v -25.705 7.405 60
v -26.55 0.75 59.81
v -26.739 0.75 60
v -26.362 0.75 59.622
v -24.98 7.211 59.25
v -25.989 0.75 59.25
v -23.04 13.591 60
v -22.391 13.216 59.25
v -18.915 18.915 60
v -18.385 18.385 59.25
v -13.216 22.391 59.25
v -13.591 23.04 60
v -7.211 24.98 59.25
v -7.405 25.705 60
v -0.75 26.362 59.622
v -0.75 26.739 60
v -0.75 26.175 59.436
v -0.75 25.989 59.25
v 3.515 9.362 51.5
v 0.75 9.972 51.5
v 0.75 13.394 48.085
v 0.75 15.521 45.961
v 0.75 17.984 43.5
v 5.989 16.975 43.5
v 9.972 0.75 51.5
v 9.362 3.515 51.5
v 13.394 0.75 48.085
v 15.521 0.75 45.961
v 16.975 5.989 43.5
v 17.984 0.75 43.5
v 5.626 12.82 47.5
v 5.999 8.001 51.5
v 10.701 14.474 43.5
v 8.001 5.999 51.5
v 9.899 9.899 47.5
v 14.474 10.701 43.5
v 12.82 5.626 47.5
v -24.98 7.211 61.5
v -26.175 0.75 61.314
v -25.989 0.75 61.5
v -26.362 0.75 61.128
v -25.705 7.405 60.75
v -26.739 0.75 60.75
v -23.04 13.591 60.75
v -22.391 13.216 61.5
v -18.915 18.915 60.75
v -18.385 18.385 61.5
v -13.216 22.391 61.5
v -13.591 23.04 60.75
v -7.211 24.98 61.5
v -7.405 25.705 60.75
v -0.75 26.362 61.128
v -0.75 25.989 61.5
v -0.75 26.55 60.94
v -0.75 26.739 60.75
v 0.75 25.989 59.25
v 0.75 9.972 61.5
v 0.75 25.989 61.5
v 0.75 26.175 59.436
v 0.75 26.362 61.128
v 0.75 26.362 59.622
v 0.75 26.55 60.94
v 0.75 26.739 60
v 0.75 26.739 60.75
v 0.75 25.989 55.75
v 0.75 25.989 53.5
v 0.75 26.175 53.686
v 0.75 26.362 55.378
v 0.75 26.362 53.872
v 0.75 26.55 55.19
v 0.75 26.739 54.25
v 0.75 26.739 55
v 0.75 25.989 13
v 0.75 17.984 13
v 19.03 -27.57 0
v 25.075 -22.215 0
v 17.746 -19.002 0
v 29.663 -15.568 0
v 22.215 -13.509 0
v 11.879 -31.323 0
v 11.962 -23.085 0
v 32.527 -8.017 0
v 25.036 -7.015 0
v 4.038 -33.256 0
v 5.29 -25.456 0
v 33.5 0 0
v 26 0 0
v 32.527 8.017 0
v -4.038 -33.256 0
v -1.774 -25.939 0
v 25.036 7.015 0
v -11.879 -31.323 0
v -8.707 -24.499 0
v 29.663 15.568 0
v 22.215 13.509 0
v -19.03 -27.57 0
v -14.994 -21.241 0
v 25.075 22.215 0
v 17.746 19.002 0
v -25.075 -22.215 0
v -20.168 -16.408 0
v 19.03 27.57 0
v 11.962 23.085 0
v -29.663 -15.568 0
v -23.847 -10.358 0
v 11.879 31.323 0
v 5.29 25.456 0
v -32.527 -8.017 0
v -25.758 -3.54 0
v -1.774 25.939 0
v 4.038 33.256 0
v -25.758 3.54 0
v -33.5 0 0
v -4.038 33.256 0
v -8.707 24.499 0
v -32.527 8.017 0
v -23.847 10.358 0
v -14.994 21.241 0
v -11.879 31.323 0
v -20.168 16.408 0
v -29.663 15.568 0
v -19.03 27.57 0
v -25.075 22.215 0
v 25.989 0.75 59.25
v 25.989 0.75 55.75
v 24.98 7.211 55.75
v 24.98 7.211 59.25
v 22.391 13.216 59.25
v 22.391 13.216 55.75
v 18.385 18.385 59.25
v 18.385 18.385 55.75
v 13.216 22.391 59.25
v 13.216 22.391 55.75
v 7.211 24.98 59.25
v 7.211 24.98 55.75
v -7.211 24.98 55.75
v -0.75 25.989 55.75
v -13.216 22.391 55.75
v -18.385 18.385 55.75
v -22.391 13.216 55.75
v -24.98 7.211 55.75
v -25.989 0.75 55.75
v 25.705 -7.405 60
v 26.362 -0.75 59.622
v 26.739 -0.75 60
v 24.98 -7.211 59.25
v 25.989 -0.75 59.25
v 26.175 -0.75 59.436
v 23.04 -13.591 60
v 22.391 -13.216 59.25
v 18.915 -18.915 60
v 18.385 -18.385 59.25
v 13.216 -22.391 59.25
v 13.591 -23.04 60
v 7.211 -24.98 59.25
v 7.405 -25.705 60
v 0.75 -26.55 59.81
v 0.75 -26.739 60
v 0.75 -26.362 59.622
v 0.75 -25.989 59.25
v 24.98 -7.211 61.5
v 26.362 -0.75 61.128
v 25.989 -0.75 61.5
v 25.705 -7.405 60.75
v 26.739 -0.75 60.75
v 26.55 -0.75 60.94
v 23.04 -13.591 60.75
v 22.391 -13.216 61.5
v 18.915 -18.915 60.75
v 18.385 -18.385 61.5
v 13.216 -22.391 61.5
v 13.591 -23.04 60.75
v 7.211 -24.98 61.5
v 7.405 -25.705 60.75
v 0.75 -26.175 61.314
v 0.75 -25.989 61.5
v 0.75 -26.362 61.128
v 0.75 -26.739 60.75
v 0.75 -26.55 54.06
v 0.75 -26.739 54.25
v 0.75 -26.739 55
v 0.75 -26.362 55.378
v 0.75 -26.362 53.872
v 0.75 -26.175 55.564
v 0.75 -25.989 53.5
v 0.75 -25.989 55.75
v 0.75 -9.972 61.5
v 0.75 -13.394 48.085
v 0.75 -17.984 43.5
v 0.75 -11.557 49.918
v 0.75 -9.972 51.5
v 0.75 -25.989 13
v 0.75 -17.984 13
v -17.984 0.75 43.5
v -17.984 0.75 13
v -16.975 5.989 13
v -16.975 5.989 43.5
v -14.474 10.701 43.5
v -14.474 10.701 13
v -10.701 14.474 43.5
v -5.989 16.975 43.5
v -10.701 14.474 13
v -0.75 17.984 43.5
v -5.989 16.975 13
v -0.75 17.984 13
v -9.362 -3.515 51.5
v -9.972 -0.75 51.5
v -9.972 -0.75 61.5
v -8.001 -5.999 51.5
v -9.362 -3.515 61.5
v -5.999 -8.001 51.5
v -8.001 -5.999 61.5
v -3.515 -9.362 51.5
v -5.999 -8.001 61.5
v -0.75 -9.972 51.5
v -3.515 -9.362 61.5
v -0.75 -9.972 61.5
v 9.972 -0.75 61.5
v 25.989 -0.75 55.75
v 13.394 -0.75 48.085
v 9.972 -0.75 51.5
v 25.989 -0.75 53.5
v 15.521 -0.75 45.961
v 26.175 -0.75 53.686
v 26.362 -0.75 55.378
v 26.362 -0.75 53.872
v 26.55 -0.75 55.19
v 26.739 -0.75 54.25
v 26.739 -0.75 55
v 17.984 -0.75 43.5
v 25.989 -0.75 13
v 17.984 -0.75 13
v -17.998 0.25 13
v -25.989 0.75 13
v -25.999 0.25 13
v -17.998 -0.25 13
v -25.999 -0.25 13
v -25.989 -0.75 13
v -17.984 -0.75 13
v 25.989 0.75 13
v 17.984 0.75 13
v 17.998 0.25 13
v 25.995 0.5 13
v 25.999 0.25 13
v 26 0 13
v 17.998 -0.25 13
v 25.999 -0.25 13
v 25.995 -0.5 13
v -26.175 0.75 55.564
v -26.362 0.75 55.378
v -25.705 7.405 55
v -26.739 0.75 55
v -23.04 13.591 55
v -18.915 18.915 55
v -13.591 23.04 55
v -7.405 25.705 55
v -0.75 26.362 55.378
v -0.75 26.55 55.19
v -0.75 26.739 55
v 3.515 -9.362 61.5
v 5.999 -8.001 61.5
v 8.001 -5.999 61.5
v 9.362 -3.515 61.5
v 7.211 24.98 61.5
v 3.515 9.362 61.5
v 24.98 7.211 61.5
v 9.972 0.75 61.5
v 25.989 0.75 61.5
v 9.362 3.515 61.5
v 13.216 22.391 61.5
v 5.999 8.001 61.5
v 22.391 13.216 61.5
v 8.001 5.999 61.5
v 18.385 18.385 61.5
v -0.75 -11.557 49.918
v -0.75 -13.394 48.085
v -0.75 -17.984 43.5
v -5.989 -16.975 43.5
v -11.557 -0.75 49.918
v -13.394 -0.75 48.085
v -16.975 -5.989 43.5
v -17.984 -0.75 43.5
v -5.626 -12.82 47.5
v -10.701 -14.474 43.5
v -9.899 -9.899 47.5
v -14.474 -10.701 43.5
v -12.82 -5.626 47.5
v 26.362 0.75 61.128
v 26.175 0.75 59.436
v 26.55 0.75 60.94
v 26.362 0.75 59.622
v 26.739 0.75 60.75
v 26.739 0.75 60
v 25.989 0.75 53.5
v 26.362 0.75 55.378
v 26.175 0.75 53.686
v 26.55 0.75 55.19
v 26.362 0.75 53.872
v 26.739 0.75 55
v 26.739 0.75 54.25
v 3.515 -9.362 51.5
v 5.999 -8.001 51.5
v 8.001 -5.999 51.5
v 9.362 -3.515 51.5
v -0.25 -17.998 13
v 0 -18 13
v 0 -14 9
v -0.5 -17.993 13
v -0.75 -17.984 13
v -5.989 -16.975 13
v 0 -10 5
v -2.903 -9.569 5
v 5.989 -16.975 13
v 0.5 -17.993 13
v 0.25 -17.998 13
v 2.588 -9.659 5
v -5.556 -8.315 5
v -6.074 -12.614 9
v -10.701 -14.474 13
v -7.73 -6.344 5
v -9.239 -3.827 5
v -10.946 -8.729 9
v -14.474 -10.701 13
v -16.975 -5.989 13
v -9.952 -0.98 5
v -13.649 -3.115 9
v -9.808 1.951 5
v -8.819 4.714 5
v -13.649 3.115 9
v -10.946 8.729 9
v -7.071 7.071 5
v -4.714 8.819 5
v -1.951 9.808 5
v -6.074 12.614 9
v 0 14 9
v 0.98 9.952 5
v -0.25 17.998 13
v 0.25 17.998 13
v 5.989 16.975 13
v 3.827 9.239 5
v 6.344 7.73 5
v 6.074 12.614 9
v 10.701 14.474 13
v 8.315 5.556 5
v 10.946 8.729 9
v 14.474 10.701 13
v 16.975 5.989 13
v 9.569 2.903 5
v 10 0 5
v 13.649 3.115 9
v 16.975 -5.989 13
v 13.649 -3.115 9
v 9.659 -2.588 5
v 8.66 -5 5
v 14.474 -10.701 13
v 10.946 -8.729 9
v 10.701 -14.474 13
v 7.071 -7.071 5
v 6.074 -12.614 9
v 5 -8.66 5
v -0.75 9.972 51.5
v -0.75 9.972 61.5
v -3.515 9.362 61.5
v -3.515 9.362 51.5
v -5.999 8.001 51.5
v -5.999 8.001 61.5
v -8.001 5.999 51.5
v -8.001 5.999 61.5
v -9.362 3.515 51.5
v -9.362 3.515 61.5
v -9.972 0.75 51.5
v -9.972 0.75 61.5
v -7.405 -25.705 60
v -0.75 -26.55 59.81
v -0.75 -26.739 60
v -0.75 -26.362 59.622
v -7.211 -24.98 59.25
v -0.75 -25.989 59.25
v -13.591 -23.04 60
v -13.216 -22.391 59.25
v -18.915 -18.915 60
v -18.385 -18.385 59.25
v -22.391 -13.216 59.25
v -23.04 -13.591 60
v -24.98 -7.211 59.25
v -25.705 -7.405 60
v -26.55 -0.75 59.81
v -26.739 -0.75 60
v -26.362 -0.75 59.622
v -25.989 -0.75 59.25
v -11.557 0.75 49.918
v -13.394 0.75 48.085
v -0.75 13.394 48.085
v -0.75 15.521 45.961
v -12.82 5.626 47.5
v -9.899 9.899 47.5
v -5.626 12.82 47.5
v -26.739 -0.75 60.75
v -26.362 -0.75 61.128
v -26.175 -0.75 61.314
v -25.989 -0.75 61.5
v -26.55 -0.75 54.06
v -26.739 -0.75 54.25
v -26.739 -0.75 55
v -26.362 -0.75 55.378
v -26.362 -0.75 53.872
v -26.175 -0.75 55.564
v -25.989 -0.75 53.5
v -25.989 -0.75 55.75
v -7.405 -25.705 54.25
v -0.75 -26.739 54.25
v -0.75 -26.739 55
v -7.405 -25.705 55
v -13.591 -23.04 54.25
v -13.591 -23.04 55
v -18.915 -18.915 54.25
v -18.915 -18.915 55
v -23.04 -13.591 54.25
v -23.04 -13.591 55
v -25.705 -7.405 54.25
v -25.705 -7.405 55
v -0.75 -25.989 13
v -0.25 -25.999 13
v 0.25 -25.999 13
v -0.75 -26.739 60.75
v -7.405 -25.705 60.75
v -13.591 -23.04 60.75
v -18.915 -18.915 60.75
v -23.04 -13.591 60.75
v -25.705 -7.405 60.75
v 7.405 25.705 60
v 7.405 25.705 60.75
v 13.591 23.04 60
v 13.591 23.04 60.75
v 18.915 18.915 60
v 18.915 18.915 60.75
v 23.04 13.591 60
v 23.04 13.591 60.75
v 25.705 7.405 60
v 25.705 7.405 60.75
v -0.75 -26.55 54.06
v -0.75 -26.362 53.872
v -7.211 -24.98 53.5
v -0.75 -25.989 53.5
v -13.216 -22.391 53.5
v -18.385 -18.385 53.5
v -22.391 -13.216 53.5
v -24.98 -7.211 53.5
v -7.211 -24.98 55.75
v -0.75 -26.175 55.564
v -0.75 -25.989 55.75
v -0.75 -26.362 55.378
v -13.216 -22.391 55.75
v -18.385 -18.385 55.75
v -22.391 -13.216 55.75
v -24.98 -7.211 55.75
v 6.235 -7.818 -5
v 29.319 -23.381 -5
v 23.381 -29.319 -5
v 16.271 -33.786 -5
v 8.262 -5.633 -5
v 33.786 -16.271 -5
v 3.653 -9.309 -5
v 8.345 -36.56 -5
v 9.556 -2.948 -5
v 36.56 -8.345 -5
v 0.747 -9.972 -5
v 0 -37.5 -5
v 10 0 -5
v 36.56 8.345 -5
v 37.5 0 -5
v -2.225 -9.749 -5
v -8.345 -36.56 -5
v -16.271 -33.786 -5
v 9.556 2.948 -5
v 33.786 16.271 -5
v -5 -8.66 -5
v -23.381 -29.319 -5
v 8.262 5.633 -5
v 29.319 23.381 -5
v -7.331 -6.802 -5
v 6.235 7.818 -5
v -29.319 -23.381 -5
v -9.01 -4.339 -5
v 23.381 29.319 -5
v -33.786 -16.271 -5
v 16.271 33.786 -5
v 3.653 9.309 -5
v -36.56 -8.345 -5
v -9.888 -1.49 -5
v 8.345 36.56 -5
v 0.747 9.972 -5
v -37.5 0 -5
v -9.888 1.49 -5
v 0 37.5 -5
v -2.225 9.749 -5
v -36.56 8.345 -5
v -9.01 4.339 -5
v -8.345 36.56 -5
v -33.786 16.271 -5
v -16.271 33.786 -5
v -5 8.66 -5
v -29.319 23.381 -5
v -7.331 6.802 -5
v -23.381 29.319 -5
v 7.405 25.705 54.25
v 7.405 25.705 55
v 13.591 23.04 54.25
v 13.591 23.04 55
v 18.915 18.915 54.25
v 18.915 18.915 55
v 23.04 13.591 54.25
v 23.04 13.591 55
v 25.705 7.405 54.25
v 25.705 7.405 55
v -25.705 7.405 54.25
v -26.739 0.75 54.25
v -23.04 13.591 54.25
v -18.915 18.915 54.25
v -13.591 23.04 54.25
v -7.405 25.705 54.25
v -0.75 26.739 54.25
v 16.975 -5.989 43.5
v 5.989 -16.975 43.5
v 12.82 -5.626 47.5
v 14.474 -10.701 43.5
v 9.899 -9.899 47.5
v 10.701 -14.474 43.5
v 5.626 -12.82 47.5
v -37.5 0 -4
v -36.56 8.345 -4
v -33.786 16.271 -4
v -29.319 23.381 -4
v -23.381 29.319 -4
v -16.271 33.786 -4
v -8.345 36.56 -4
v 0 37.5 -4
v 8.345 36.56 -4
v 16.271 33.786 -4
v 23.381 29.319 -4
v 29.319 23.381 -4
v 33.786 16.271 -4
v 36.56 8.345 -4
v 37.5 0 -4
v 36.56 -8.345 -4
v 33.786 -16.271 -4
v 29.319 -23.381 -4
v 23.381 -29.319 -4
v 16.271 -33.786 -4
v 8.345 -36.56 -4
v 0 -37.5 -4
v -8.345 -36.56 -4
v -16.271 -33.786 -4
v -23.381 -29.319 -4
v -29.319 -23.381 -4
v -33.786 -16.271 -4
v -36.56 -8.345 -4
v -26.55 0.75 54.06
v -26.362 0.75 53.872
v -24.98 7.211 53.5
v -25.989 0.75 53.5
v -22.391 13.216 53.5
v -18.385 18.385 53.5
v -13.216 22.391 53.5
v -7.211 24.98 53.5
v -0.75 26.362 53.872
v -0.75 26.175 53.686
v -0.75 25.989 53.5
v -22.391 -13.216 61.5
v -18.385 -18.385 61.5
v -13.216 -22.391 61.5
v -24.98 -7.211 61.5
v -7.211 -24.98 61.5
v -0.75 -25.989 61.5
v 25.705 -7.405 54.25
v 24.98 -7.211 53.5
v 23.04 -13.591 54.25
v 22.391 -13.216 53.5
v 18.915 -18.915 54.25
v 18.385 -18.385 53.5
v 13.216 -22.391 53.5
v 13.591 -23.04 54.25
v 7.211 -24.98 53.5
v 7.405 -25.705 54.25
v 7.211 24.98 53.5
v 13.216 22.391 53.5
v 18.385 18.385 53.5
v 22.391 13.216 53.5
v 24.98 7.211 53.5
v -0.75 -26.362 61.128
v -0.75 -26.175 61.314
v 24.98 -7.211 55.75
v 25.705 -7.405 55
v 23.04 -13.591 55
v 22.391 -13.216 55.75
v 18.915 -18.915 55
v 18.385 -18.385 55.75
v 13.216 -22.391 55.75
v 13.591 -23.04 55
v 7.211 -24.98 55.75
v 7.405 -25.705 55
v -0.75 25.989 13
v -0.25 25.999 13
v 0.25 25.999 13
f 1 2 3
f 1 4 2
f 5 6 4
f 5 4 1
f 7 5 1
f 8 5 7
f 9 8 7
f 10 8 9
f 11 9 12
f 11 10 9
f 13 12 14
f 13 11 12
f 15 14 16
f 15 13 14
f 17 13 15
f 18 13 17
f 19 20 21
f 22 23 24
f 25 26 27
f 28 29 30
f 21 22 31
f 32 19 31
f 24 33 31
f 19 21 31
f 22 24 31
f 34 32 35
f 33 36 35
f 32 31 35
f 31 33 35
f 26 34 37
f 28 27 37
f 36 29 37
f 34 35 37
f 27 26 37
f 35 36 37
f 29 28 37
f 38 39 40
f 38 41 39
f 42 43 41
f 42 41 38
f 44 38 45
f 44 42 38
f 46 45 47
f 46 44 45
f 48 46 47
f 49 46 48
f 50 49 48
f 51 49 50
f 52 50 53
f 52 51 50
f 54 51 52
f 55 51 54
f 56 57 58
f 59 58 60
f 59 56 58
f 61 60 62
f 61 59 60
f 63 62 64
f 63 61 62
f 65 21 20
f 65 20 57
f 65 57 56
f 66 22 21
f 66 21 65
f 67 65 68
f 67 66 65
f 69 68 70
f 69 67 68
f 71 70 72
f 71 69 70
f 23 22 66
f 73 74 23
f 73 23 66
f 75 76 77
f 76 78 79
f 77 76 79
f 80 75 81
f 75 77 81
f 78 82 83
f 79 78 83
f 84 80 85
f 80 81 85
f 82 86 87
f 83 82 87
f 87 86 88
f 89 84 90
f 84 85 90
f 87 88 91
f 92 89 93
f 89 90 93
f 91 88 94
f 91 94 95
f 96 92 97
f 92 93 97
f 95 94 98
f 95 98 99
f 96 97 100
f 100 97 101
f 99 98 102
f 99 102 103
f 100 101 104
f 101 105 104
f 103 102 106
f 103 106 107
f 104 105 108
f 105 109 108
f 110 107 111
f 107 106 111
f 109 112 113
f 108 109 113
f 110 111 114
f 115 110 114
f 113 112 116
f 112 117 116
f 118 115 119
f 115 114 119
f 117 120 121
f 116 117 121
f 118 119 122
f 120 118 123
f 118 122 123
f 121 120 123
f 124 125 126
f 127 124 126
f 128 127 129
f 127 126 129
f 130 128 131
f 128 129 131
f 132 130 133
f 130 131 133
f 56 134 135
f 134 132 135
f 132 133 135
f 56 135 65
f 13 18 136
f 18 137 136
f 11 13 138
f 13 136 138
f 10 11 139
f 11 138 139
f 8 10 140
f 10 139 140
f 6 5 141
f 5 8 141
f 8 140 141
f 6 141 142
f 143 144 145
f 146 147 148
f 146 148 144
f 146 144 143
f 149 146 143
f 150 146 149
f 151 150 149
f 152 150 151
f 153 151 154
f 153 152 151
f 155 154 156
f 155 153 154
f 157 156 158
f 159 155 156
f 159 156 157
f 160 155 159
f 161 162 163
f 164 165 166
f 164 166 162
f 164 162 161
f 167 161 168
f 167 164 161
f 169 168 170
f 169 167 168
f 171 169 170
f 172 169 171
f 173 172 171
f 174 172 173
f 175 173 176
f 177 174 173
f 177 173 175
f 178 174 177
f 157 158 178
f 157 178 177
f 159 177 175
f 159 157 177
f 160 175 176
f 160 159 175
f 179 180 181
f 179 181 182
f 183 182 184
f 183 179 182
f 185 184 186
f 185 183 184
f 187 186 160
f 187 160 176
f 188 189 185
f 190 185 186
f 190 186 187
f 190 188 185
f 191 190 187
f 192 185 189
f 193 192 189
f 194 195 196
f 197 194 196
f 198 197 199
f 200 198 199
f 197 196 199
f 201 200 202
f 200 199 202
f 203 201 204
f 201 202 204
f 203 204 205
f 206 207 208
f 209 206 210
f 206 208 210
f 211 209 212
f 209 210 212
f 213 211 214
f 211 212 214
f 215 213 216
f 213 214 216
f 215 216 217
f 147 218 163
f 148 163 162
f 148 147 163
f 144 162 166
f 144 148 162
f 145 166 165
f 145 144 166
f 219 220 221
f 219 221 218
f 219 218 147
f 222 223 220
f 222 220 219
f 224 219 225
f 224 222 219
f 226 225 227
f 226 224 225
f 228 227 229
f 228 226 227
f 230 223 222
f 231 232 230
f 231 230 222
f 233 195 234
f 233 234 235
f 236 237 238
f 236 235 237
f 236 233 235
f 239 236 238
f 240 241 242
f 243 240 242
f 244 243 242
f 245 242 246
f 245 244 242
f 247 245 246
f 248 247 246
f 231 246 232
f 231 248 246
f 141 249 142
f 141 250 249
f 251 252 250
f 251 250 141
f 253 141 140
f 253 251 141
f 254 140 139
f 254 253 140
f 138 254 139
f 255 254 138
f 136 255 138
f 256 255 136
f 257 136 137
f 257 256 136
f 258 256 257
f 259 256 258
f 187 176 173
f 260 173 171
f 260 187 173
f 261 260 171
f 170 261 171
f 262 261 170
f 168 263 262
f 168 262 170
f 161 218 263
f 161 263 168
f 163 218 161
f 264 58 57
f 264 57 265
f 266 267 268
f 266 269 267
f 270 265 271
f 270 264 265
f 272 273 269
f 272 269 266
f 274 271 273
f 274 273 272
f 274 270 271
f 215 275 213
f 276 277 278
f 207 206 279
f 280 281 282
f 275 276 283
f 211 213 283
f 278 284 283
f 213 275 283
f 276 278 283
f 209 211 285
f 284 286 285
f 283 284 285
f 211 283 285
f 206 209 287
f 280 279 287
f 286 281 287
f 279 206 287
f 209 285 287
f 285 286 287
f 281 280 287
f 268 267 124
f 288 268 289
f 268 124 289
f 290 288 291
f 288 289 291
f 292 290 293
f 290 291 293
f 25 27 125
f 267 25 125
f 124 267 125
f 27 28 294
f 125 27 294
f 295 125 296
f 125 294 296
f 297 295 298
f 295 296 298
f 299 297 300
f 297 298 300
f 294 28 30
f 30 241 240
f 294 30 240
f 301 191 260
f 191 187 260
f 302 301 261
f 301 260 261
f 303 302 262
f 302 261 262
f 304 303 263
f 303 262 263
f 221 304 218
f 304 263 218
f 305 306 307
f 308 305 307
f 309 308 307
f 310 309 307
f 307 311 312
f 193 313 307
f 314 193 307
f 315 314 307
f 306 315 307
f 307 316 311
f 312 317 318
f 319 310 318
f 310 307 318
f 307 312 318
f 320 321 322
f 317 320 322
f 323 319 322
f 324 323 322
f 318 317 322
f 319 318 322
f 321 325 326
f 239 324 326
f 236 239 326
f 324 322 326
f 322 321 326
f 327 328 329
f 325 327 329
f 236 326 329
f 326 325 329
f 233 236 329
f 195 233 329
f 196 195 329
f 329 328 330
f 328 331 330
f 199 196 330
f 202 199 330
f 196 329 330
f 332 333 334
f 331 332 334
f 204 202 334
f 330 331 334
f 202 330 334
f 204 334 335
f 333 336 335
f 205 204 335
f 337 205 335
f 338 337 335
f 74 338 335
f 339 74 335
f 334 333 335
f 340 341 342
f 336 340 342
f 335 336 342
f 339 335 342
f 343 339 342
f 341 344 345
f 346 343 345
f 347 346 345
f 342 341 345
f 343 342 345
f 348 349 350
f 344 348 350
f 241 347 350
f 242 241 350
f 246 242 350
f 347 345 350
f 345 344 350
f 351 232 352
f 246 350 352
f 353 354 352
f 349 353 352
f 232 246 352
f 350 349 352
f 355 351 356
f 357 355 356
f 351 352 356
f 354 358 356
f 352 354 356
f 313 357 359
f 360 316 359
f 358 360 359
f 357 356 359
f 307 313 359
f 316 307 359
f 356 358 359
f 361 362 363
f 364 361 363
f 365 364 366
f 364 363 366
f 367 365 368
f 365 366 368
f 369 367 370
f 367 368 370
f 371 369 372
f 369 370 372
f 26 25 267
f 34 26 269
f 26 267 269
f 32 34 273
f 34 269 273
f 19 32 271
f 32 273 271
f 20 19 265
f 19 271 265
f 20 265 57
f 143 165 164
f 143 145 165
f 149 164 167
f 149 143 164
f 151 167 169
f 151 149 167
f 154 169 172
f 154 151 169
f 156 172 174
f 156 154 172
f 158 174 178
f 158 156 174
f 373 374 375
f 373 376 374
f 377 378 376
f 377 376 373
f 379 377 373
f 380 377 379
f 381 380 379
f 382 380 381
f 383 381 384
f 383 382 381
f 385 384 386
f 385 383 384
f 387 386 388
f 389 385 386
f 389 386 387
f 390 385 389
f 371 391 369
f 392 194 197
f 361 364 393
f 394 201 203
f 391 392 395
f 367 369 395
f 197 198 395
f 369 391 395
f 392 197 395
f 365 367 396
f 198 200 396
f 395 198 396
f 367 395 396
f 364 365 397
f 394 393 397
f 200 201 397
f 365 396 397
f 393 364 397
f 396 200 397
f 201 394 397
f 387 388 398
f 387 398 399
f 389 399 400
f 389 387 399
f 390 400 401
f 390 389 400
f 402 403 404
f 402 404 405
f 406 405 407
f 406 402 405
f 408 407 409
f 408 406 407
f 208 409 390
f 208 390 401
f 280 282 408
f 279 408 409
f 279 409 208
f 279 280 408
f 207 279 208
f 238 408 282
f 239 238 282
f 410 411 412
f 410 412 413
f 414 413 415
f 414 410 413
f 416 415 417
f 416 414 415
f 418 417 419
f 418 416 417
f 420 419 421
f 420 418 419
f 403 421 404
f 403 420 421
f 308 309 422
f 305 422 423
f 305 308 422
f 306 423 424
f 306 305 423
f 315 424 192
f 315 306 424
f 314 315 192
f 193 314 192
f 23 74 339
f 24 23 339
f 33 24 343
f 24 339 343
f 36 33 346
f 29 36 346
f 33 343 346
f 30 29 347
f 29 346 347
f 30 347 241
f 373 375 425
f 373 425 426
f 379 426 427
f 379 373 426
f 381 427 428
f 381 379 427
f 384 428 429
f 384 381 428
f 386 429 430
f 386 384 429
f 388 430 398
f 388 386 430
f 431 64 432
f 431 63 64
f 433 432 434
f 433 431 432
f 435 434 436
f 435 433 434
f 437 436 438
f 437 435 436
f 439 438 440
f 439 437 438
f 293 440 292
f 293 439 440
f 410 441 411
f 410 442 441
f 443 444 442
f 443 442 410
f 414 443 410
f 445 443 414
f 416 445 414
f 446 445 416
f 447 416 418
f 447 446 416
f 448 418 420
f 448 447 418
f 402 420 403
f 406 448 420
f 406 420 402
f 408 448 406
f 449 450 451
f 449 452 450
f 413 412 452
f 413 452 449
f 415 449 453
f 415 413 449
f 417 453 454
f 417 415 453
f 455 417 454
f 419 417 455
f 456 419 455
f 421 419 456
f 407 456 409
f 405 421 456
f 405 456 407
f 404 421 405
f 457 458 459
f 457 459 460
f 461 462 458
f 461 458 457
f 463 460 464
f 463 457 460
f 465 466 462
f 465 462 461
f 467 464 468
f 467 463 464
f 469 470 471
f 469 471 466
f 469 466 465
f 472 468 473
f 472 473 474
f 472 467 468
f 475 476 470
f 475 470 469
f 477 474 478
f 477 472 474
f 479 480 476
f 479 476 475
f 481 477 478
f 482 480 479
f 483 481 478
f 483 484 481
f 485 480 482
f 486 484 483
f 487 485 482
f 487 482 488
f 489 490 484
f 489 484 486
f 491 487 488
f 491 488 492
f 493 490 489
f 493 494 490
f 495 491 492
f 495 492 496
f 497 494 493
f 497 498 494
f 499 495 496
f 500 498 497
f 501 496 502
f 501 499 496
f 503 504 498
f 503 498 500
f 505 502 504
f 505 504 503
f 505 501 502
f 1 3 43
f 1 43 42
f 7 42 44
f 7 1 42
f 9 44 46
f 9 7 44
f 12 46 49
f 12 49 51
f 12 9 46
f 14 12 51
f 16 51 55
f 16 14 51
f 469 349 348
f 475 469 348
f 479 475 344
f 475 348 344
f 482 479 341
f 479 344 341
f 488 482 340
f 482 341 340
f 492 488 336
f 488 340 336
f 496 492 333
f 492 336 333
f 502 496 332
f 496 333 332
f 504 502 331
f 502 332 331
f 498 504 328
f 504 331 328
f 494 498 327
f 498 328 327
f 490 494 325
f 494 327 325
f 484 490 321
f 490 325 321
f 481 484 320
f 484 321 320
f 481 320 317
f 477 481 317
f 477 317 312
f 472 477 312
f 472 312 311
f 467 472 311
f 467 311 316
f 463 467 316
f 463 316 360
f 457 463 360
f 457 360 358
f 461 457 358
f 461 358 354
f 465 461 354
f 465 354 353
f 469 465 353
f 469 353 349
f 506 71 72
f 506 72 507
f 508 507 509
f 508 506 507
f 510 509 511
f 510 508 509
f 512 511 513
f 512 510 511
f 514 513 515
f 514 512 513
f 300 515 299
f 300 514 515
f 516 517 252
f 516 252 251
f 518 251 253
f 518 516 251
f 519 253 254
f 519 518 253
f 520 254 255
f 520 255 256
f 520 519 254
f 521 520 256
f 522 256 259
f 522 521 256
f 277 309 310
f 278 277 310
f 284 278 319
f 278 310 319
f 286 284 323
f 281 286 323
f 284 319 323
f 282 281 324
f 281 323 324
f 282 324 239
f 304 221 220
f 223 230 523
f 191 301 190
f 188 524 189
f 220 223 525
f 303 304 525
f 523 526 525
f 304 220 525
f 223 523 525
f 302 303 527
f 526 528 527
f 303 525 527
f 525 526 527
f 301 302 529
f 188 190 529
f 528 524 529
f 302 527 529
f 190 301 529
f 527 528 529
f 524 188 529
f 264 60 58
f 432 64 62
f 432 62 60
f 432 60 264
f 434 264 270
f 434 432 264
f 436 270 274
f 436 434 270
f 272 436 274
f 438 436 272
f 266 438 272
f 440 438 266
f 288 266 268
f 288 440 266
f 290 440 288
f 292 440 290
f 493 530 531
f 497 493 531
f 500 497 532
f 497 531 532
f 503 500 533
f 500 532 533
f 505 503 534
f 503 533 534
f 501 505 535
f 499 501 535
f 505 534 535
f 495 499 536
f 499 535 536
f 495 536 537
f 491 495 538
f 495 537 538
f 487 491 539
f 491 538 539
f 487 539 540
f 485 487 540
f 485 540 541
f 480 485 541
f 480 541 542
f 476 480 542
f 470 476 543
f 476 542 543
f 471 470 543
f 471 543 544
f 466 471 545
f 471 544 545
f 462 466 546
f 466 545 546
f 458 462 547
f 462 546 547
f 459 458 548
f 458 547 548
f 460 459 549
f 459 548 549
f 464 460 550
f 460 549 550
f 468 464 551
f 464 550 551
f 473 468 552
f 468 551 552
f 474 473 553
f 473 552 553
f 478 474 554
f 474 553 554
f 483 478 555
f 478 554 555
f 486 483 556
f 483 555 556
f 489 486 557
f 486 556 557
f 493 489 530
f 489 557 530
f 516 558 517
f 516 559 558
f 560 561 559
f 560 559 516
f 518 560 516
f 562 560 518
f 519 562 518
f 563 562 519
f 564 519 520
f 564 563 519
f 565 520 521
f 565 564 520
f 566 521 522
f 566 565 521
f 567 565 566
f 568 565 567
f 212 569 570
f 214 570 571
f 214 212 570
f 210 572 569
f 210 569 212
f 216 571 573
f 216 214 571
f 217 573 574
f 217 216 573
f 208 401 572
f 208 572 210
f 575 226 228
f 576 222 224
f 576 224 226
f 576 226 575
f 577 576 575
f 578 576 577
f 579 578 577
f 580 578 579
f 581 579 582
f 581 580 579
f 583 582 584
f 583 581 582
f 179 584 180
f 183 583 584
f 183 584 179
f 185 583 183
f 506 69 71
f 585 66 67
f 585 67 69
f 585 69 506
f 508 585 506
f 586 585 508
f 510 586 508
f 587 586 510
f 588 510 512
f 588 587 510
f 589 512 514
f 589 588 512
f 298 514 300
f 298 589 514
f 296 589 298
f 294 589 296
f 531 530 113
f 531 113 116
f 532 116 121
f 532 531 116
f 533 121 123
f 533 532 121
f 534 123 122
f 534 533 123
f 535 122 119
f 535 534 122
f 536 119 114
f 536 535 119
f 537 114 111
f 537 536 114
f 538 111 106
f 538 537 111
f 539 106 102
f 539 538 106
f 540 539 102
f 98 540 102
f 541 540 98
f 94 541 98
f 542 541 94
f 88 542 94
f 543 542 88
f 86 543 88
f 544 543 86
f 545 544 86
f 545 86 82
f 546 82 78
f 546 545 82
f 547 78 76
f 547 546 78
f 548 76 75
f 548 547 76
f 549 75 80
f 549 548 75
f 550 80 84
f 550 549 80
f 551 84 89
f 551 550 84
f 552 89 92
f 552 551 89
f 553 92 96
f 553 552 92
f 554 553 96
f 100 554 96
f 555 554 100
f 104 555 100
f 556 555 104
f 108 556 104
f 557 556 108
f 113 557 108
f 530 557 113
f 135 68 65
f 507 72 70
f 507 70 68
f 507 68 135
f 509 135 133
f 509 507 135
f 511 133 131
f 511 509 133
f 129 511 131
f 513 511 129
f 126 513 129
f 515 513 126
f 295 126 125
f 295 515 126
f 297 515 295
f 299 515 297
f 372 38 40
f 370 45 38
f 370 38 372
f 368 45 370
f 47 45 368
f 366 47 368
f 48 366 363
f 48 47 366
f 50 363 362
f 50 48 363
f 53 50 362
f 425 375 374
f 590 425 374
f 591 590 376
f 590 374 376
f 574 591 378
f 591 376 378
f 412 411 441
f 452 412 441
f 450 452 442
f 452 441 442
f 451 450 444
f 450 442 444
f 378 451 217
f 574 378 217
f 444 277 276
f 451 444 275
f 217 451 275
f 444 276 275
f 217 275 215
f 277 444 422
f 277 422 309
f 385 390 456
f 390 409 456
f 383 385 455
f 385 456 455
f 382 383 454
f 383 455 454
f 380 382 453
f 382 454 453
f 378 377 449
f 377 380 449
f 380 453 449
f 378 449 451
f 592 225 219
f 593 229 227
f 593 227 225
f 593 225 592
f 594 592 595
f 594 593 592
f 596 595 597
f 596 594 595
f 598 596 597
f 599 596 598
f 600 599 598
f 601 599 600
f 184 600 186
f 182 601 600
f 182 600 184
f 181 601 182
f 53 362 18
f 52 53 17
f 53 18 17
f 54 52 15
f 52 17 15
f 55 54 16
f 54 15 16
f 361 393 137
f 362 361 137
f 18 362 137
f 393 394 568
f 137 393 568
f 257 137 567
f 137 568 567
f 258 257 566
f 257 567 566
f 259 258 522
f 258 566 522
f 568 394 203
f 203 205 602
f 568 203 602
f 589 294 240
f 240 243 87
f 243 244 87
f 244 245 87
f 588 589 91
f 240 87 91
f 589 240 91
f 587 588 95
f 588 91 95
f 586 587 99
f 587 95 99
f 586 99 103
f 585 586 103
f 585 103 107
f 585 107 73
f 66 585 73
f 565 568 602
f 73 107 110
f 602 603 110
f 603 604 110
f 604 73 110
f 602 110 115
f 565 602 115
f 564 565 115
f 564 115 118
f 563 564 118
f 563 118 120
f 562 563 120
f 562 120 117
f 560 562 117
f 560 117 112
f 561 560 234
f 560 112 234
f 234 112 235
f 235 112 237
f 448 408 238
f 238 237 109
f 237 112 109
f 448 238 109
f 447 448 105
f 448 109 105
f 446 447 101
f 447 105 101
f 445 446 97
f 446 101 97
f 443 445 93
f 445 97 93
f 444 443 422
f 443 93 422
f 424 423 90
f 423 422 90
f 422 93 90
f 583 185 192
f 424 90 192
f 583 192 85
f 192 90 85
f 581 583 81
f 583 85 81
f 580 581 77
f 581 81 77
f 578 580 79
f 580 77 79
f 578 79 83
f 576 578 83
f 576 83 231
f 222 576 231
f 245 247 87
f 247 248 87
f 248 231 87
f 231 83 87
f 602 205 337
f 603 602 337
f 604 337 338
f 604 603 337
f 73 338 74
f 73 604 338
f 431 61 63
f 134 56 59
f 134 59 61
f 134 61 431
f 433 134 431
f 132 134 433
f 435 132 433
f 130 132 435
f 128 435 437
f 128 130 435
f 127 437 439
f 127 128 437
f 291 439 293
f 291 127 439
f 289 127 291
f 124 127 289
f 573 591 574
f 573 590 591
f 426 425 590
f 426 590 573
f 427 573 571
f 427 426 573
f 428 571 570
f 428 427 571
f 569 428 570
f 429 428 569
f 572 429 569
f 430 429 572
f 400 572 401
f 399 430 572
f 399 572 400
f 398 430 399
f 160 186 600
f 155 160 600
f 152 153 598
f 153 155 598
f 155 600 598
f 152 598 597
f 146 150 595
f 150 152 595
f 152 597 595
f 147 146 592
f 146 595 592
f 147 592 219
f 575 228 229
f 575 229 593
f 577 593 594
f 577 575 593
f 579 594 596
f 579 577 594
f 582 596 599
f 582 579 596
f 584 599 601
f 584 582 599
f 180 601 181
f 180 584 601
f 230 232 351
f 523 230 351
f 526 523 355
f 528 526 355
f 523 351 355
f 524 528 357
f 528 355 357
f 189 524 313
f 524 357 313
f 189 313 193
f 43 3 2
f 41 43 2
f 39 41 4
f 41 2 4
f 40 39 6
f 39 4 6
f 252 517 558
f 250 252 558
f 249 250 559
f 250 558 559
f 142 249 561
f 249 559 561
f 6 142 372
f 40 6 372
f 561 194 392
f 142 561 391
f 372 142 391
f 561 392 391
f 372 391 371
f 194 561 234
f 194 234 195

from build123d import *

# Parameters (mm, degrees)
AXLE_BASE_SKETCH_R        = 26
AXLE_DEPTH                = 61.5
GUARD_BASE_R              = 37.5
GUARD_DEPTH               = 5
INNER_AXLE_HOLE_BASE_R    = 10
INNER_AXLE_HOLE_DEPTH     = 67.5
BEND_START                = -48.5
BEND_ROOM_BASE_W          = 1.5
BEND_ROOM_BASE_H          = 75
BEND_ROOM_1_DEPTH         = 48.5
BEND_ROOM_2_COUNT         = 2
BEND_ROOM_2_ANGLE         = 90
EASY_REMOVAL_CHAMFER_SIZE = 4


with BuildPart() as part:
    # Axle base sketch → Axle (new body)
    with BuildSketch(Plane.XY):
        Circle(AXLE_BASE_SKETCH_R)
    extrude(amount=AXLE_DEPTH)

    # Guard base → Guard (add)
    with BuildSketch(Plane(origin=(0, 0, 0), x_dir=(-1, 0, 0), z_dir=(0, 0, -1))):
        Circle(GUARD_BASE_R)
    extrude(amount=GUARD_DEPTH)

    # Inner axle hole base → Inner axle hole (cut, through all)
    with BuildSketch(Plane.XY.offset(61.5)):
        Circle(INNER_AXLE_HOLE_BASE_R)
    extrude(amount=-INNER_AXLE_HOLE_DEPTH, mode=Mode.SUBTRACT)

    # Mate ring base → Mate rings (revolve)
    with BuildSketch(Plane(origin=(0, 0, 0), x_dir=(1, 0, 0), z_dir=(0, 1, 0))):
        Polygon((26, -61.5), (26.75, -60.75), (26.75, -60), (26, -59.25), align=None)
        Polygon((26, -55.75), (26.75, -55), (26.75, -54.25), (26, -53.5), align=None)
    revolve(axis=Axis((0, 0, 0), (0, 0, -1)))

    # Inner mass remove base → Inner mass remove (revolve, cut)
    with BuildSketch(Plane(origin=(0, 0, 0), x_dir=(0, 0, -1), z_dir=(1, 0, 0))):
        Polygon((-61.5, 0), (-43.5, -18), (-13, -18), (5, 0), align=None)
    revolve(axis=Axis((0, 0, 0), (0, 0, -1)), mode=Mode.SUBTRACT)

    # Bend room base → Bend room 1 (cut)
    with BuildSketch(Plane.XY.offset(61.5).offset(BEND_START)):
        Rectangle(BEND_ROOM_BASE_W, BEND_ROOM_BASE_H)
    bend_room_1 = extrude(amount=BEND_ROOM_1_DEPTH, mode=Mode.SUBTRACT)

    # Bend room 2: Bend room 1 ×2 about axis
    bend_room_2_axis = Axis((0, 0, 0), (0, 0, -1))
    for i in range(1, BEND_ROOM_2_COUNT):
        add(bend_room_1.rotate(bend_room_2_axis, i * BEND_ROOM_2_ANGLE / (BEND_ROOM_2_COUNT - 1)), mode=Mode.SUBTRACT)

    # Easy removal chamfer
    easy_removal_chamfer_edges = [part.edges().sort_by_distance(p)[0] for p in [
        (37.5, 0, 0),
    ]]
    chamfer(easy_removal_chamfer_edges, length=EASY_REMOVAL_CHAMFER_SIZE)


solid = part.part
